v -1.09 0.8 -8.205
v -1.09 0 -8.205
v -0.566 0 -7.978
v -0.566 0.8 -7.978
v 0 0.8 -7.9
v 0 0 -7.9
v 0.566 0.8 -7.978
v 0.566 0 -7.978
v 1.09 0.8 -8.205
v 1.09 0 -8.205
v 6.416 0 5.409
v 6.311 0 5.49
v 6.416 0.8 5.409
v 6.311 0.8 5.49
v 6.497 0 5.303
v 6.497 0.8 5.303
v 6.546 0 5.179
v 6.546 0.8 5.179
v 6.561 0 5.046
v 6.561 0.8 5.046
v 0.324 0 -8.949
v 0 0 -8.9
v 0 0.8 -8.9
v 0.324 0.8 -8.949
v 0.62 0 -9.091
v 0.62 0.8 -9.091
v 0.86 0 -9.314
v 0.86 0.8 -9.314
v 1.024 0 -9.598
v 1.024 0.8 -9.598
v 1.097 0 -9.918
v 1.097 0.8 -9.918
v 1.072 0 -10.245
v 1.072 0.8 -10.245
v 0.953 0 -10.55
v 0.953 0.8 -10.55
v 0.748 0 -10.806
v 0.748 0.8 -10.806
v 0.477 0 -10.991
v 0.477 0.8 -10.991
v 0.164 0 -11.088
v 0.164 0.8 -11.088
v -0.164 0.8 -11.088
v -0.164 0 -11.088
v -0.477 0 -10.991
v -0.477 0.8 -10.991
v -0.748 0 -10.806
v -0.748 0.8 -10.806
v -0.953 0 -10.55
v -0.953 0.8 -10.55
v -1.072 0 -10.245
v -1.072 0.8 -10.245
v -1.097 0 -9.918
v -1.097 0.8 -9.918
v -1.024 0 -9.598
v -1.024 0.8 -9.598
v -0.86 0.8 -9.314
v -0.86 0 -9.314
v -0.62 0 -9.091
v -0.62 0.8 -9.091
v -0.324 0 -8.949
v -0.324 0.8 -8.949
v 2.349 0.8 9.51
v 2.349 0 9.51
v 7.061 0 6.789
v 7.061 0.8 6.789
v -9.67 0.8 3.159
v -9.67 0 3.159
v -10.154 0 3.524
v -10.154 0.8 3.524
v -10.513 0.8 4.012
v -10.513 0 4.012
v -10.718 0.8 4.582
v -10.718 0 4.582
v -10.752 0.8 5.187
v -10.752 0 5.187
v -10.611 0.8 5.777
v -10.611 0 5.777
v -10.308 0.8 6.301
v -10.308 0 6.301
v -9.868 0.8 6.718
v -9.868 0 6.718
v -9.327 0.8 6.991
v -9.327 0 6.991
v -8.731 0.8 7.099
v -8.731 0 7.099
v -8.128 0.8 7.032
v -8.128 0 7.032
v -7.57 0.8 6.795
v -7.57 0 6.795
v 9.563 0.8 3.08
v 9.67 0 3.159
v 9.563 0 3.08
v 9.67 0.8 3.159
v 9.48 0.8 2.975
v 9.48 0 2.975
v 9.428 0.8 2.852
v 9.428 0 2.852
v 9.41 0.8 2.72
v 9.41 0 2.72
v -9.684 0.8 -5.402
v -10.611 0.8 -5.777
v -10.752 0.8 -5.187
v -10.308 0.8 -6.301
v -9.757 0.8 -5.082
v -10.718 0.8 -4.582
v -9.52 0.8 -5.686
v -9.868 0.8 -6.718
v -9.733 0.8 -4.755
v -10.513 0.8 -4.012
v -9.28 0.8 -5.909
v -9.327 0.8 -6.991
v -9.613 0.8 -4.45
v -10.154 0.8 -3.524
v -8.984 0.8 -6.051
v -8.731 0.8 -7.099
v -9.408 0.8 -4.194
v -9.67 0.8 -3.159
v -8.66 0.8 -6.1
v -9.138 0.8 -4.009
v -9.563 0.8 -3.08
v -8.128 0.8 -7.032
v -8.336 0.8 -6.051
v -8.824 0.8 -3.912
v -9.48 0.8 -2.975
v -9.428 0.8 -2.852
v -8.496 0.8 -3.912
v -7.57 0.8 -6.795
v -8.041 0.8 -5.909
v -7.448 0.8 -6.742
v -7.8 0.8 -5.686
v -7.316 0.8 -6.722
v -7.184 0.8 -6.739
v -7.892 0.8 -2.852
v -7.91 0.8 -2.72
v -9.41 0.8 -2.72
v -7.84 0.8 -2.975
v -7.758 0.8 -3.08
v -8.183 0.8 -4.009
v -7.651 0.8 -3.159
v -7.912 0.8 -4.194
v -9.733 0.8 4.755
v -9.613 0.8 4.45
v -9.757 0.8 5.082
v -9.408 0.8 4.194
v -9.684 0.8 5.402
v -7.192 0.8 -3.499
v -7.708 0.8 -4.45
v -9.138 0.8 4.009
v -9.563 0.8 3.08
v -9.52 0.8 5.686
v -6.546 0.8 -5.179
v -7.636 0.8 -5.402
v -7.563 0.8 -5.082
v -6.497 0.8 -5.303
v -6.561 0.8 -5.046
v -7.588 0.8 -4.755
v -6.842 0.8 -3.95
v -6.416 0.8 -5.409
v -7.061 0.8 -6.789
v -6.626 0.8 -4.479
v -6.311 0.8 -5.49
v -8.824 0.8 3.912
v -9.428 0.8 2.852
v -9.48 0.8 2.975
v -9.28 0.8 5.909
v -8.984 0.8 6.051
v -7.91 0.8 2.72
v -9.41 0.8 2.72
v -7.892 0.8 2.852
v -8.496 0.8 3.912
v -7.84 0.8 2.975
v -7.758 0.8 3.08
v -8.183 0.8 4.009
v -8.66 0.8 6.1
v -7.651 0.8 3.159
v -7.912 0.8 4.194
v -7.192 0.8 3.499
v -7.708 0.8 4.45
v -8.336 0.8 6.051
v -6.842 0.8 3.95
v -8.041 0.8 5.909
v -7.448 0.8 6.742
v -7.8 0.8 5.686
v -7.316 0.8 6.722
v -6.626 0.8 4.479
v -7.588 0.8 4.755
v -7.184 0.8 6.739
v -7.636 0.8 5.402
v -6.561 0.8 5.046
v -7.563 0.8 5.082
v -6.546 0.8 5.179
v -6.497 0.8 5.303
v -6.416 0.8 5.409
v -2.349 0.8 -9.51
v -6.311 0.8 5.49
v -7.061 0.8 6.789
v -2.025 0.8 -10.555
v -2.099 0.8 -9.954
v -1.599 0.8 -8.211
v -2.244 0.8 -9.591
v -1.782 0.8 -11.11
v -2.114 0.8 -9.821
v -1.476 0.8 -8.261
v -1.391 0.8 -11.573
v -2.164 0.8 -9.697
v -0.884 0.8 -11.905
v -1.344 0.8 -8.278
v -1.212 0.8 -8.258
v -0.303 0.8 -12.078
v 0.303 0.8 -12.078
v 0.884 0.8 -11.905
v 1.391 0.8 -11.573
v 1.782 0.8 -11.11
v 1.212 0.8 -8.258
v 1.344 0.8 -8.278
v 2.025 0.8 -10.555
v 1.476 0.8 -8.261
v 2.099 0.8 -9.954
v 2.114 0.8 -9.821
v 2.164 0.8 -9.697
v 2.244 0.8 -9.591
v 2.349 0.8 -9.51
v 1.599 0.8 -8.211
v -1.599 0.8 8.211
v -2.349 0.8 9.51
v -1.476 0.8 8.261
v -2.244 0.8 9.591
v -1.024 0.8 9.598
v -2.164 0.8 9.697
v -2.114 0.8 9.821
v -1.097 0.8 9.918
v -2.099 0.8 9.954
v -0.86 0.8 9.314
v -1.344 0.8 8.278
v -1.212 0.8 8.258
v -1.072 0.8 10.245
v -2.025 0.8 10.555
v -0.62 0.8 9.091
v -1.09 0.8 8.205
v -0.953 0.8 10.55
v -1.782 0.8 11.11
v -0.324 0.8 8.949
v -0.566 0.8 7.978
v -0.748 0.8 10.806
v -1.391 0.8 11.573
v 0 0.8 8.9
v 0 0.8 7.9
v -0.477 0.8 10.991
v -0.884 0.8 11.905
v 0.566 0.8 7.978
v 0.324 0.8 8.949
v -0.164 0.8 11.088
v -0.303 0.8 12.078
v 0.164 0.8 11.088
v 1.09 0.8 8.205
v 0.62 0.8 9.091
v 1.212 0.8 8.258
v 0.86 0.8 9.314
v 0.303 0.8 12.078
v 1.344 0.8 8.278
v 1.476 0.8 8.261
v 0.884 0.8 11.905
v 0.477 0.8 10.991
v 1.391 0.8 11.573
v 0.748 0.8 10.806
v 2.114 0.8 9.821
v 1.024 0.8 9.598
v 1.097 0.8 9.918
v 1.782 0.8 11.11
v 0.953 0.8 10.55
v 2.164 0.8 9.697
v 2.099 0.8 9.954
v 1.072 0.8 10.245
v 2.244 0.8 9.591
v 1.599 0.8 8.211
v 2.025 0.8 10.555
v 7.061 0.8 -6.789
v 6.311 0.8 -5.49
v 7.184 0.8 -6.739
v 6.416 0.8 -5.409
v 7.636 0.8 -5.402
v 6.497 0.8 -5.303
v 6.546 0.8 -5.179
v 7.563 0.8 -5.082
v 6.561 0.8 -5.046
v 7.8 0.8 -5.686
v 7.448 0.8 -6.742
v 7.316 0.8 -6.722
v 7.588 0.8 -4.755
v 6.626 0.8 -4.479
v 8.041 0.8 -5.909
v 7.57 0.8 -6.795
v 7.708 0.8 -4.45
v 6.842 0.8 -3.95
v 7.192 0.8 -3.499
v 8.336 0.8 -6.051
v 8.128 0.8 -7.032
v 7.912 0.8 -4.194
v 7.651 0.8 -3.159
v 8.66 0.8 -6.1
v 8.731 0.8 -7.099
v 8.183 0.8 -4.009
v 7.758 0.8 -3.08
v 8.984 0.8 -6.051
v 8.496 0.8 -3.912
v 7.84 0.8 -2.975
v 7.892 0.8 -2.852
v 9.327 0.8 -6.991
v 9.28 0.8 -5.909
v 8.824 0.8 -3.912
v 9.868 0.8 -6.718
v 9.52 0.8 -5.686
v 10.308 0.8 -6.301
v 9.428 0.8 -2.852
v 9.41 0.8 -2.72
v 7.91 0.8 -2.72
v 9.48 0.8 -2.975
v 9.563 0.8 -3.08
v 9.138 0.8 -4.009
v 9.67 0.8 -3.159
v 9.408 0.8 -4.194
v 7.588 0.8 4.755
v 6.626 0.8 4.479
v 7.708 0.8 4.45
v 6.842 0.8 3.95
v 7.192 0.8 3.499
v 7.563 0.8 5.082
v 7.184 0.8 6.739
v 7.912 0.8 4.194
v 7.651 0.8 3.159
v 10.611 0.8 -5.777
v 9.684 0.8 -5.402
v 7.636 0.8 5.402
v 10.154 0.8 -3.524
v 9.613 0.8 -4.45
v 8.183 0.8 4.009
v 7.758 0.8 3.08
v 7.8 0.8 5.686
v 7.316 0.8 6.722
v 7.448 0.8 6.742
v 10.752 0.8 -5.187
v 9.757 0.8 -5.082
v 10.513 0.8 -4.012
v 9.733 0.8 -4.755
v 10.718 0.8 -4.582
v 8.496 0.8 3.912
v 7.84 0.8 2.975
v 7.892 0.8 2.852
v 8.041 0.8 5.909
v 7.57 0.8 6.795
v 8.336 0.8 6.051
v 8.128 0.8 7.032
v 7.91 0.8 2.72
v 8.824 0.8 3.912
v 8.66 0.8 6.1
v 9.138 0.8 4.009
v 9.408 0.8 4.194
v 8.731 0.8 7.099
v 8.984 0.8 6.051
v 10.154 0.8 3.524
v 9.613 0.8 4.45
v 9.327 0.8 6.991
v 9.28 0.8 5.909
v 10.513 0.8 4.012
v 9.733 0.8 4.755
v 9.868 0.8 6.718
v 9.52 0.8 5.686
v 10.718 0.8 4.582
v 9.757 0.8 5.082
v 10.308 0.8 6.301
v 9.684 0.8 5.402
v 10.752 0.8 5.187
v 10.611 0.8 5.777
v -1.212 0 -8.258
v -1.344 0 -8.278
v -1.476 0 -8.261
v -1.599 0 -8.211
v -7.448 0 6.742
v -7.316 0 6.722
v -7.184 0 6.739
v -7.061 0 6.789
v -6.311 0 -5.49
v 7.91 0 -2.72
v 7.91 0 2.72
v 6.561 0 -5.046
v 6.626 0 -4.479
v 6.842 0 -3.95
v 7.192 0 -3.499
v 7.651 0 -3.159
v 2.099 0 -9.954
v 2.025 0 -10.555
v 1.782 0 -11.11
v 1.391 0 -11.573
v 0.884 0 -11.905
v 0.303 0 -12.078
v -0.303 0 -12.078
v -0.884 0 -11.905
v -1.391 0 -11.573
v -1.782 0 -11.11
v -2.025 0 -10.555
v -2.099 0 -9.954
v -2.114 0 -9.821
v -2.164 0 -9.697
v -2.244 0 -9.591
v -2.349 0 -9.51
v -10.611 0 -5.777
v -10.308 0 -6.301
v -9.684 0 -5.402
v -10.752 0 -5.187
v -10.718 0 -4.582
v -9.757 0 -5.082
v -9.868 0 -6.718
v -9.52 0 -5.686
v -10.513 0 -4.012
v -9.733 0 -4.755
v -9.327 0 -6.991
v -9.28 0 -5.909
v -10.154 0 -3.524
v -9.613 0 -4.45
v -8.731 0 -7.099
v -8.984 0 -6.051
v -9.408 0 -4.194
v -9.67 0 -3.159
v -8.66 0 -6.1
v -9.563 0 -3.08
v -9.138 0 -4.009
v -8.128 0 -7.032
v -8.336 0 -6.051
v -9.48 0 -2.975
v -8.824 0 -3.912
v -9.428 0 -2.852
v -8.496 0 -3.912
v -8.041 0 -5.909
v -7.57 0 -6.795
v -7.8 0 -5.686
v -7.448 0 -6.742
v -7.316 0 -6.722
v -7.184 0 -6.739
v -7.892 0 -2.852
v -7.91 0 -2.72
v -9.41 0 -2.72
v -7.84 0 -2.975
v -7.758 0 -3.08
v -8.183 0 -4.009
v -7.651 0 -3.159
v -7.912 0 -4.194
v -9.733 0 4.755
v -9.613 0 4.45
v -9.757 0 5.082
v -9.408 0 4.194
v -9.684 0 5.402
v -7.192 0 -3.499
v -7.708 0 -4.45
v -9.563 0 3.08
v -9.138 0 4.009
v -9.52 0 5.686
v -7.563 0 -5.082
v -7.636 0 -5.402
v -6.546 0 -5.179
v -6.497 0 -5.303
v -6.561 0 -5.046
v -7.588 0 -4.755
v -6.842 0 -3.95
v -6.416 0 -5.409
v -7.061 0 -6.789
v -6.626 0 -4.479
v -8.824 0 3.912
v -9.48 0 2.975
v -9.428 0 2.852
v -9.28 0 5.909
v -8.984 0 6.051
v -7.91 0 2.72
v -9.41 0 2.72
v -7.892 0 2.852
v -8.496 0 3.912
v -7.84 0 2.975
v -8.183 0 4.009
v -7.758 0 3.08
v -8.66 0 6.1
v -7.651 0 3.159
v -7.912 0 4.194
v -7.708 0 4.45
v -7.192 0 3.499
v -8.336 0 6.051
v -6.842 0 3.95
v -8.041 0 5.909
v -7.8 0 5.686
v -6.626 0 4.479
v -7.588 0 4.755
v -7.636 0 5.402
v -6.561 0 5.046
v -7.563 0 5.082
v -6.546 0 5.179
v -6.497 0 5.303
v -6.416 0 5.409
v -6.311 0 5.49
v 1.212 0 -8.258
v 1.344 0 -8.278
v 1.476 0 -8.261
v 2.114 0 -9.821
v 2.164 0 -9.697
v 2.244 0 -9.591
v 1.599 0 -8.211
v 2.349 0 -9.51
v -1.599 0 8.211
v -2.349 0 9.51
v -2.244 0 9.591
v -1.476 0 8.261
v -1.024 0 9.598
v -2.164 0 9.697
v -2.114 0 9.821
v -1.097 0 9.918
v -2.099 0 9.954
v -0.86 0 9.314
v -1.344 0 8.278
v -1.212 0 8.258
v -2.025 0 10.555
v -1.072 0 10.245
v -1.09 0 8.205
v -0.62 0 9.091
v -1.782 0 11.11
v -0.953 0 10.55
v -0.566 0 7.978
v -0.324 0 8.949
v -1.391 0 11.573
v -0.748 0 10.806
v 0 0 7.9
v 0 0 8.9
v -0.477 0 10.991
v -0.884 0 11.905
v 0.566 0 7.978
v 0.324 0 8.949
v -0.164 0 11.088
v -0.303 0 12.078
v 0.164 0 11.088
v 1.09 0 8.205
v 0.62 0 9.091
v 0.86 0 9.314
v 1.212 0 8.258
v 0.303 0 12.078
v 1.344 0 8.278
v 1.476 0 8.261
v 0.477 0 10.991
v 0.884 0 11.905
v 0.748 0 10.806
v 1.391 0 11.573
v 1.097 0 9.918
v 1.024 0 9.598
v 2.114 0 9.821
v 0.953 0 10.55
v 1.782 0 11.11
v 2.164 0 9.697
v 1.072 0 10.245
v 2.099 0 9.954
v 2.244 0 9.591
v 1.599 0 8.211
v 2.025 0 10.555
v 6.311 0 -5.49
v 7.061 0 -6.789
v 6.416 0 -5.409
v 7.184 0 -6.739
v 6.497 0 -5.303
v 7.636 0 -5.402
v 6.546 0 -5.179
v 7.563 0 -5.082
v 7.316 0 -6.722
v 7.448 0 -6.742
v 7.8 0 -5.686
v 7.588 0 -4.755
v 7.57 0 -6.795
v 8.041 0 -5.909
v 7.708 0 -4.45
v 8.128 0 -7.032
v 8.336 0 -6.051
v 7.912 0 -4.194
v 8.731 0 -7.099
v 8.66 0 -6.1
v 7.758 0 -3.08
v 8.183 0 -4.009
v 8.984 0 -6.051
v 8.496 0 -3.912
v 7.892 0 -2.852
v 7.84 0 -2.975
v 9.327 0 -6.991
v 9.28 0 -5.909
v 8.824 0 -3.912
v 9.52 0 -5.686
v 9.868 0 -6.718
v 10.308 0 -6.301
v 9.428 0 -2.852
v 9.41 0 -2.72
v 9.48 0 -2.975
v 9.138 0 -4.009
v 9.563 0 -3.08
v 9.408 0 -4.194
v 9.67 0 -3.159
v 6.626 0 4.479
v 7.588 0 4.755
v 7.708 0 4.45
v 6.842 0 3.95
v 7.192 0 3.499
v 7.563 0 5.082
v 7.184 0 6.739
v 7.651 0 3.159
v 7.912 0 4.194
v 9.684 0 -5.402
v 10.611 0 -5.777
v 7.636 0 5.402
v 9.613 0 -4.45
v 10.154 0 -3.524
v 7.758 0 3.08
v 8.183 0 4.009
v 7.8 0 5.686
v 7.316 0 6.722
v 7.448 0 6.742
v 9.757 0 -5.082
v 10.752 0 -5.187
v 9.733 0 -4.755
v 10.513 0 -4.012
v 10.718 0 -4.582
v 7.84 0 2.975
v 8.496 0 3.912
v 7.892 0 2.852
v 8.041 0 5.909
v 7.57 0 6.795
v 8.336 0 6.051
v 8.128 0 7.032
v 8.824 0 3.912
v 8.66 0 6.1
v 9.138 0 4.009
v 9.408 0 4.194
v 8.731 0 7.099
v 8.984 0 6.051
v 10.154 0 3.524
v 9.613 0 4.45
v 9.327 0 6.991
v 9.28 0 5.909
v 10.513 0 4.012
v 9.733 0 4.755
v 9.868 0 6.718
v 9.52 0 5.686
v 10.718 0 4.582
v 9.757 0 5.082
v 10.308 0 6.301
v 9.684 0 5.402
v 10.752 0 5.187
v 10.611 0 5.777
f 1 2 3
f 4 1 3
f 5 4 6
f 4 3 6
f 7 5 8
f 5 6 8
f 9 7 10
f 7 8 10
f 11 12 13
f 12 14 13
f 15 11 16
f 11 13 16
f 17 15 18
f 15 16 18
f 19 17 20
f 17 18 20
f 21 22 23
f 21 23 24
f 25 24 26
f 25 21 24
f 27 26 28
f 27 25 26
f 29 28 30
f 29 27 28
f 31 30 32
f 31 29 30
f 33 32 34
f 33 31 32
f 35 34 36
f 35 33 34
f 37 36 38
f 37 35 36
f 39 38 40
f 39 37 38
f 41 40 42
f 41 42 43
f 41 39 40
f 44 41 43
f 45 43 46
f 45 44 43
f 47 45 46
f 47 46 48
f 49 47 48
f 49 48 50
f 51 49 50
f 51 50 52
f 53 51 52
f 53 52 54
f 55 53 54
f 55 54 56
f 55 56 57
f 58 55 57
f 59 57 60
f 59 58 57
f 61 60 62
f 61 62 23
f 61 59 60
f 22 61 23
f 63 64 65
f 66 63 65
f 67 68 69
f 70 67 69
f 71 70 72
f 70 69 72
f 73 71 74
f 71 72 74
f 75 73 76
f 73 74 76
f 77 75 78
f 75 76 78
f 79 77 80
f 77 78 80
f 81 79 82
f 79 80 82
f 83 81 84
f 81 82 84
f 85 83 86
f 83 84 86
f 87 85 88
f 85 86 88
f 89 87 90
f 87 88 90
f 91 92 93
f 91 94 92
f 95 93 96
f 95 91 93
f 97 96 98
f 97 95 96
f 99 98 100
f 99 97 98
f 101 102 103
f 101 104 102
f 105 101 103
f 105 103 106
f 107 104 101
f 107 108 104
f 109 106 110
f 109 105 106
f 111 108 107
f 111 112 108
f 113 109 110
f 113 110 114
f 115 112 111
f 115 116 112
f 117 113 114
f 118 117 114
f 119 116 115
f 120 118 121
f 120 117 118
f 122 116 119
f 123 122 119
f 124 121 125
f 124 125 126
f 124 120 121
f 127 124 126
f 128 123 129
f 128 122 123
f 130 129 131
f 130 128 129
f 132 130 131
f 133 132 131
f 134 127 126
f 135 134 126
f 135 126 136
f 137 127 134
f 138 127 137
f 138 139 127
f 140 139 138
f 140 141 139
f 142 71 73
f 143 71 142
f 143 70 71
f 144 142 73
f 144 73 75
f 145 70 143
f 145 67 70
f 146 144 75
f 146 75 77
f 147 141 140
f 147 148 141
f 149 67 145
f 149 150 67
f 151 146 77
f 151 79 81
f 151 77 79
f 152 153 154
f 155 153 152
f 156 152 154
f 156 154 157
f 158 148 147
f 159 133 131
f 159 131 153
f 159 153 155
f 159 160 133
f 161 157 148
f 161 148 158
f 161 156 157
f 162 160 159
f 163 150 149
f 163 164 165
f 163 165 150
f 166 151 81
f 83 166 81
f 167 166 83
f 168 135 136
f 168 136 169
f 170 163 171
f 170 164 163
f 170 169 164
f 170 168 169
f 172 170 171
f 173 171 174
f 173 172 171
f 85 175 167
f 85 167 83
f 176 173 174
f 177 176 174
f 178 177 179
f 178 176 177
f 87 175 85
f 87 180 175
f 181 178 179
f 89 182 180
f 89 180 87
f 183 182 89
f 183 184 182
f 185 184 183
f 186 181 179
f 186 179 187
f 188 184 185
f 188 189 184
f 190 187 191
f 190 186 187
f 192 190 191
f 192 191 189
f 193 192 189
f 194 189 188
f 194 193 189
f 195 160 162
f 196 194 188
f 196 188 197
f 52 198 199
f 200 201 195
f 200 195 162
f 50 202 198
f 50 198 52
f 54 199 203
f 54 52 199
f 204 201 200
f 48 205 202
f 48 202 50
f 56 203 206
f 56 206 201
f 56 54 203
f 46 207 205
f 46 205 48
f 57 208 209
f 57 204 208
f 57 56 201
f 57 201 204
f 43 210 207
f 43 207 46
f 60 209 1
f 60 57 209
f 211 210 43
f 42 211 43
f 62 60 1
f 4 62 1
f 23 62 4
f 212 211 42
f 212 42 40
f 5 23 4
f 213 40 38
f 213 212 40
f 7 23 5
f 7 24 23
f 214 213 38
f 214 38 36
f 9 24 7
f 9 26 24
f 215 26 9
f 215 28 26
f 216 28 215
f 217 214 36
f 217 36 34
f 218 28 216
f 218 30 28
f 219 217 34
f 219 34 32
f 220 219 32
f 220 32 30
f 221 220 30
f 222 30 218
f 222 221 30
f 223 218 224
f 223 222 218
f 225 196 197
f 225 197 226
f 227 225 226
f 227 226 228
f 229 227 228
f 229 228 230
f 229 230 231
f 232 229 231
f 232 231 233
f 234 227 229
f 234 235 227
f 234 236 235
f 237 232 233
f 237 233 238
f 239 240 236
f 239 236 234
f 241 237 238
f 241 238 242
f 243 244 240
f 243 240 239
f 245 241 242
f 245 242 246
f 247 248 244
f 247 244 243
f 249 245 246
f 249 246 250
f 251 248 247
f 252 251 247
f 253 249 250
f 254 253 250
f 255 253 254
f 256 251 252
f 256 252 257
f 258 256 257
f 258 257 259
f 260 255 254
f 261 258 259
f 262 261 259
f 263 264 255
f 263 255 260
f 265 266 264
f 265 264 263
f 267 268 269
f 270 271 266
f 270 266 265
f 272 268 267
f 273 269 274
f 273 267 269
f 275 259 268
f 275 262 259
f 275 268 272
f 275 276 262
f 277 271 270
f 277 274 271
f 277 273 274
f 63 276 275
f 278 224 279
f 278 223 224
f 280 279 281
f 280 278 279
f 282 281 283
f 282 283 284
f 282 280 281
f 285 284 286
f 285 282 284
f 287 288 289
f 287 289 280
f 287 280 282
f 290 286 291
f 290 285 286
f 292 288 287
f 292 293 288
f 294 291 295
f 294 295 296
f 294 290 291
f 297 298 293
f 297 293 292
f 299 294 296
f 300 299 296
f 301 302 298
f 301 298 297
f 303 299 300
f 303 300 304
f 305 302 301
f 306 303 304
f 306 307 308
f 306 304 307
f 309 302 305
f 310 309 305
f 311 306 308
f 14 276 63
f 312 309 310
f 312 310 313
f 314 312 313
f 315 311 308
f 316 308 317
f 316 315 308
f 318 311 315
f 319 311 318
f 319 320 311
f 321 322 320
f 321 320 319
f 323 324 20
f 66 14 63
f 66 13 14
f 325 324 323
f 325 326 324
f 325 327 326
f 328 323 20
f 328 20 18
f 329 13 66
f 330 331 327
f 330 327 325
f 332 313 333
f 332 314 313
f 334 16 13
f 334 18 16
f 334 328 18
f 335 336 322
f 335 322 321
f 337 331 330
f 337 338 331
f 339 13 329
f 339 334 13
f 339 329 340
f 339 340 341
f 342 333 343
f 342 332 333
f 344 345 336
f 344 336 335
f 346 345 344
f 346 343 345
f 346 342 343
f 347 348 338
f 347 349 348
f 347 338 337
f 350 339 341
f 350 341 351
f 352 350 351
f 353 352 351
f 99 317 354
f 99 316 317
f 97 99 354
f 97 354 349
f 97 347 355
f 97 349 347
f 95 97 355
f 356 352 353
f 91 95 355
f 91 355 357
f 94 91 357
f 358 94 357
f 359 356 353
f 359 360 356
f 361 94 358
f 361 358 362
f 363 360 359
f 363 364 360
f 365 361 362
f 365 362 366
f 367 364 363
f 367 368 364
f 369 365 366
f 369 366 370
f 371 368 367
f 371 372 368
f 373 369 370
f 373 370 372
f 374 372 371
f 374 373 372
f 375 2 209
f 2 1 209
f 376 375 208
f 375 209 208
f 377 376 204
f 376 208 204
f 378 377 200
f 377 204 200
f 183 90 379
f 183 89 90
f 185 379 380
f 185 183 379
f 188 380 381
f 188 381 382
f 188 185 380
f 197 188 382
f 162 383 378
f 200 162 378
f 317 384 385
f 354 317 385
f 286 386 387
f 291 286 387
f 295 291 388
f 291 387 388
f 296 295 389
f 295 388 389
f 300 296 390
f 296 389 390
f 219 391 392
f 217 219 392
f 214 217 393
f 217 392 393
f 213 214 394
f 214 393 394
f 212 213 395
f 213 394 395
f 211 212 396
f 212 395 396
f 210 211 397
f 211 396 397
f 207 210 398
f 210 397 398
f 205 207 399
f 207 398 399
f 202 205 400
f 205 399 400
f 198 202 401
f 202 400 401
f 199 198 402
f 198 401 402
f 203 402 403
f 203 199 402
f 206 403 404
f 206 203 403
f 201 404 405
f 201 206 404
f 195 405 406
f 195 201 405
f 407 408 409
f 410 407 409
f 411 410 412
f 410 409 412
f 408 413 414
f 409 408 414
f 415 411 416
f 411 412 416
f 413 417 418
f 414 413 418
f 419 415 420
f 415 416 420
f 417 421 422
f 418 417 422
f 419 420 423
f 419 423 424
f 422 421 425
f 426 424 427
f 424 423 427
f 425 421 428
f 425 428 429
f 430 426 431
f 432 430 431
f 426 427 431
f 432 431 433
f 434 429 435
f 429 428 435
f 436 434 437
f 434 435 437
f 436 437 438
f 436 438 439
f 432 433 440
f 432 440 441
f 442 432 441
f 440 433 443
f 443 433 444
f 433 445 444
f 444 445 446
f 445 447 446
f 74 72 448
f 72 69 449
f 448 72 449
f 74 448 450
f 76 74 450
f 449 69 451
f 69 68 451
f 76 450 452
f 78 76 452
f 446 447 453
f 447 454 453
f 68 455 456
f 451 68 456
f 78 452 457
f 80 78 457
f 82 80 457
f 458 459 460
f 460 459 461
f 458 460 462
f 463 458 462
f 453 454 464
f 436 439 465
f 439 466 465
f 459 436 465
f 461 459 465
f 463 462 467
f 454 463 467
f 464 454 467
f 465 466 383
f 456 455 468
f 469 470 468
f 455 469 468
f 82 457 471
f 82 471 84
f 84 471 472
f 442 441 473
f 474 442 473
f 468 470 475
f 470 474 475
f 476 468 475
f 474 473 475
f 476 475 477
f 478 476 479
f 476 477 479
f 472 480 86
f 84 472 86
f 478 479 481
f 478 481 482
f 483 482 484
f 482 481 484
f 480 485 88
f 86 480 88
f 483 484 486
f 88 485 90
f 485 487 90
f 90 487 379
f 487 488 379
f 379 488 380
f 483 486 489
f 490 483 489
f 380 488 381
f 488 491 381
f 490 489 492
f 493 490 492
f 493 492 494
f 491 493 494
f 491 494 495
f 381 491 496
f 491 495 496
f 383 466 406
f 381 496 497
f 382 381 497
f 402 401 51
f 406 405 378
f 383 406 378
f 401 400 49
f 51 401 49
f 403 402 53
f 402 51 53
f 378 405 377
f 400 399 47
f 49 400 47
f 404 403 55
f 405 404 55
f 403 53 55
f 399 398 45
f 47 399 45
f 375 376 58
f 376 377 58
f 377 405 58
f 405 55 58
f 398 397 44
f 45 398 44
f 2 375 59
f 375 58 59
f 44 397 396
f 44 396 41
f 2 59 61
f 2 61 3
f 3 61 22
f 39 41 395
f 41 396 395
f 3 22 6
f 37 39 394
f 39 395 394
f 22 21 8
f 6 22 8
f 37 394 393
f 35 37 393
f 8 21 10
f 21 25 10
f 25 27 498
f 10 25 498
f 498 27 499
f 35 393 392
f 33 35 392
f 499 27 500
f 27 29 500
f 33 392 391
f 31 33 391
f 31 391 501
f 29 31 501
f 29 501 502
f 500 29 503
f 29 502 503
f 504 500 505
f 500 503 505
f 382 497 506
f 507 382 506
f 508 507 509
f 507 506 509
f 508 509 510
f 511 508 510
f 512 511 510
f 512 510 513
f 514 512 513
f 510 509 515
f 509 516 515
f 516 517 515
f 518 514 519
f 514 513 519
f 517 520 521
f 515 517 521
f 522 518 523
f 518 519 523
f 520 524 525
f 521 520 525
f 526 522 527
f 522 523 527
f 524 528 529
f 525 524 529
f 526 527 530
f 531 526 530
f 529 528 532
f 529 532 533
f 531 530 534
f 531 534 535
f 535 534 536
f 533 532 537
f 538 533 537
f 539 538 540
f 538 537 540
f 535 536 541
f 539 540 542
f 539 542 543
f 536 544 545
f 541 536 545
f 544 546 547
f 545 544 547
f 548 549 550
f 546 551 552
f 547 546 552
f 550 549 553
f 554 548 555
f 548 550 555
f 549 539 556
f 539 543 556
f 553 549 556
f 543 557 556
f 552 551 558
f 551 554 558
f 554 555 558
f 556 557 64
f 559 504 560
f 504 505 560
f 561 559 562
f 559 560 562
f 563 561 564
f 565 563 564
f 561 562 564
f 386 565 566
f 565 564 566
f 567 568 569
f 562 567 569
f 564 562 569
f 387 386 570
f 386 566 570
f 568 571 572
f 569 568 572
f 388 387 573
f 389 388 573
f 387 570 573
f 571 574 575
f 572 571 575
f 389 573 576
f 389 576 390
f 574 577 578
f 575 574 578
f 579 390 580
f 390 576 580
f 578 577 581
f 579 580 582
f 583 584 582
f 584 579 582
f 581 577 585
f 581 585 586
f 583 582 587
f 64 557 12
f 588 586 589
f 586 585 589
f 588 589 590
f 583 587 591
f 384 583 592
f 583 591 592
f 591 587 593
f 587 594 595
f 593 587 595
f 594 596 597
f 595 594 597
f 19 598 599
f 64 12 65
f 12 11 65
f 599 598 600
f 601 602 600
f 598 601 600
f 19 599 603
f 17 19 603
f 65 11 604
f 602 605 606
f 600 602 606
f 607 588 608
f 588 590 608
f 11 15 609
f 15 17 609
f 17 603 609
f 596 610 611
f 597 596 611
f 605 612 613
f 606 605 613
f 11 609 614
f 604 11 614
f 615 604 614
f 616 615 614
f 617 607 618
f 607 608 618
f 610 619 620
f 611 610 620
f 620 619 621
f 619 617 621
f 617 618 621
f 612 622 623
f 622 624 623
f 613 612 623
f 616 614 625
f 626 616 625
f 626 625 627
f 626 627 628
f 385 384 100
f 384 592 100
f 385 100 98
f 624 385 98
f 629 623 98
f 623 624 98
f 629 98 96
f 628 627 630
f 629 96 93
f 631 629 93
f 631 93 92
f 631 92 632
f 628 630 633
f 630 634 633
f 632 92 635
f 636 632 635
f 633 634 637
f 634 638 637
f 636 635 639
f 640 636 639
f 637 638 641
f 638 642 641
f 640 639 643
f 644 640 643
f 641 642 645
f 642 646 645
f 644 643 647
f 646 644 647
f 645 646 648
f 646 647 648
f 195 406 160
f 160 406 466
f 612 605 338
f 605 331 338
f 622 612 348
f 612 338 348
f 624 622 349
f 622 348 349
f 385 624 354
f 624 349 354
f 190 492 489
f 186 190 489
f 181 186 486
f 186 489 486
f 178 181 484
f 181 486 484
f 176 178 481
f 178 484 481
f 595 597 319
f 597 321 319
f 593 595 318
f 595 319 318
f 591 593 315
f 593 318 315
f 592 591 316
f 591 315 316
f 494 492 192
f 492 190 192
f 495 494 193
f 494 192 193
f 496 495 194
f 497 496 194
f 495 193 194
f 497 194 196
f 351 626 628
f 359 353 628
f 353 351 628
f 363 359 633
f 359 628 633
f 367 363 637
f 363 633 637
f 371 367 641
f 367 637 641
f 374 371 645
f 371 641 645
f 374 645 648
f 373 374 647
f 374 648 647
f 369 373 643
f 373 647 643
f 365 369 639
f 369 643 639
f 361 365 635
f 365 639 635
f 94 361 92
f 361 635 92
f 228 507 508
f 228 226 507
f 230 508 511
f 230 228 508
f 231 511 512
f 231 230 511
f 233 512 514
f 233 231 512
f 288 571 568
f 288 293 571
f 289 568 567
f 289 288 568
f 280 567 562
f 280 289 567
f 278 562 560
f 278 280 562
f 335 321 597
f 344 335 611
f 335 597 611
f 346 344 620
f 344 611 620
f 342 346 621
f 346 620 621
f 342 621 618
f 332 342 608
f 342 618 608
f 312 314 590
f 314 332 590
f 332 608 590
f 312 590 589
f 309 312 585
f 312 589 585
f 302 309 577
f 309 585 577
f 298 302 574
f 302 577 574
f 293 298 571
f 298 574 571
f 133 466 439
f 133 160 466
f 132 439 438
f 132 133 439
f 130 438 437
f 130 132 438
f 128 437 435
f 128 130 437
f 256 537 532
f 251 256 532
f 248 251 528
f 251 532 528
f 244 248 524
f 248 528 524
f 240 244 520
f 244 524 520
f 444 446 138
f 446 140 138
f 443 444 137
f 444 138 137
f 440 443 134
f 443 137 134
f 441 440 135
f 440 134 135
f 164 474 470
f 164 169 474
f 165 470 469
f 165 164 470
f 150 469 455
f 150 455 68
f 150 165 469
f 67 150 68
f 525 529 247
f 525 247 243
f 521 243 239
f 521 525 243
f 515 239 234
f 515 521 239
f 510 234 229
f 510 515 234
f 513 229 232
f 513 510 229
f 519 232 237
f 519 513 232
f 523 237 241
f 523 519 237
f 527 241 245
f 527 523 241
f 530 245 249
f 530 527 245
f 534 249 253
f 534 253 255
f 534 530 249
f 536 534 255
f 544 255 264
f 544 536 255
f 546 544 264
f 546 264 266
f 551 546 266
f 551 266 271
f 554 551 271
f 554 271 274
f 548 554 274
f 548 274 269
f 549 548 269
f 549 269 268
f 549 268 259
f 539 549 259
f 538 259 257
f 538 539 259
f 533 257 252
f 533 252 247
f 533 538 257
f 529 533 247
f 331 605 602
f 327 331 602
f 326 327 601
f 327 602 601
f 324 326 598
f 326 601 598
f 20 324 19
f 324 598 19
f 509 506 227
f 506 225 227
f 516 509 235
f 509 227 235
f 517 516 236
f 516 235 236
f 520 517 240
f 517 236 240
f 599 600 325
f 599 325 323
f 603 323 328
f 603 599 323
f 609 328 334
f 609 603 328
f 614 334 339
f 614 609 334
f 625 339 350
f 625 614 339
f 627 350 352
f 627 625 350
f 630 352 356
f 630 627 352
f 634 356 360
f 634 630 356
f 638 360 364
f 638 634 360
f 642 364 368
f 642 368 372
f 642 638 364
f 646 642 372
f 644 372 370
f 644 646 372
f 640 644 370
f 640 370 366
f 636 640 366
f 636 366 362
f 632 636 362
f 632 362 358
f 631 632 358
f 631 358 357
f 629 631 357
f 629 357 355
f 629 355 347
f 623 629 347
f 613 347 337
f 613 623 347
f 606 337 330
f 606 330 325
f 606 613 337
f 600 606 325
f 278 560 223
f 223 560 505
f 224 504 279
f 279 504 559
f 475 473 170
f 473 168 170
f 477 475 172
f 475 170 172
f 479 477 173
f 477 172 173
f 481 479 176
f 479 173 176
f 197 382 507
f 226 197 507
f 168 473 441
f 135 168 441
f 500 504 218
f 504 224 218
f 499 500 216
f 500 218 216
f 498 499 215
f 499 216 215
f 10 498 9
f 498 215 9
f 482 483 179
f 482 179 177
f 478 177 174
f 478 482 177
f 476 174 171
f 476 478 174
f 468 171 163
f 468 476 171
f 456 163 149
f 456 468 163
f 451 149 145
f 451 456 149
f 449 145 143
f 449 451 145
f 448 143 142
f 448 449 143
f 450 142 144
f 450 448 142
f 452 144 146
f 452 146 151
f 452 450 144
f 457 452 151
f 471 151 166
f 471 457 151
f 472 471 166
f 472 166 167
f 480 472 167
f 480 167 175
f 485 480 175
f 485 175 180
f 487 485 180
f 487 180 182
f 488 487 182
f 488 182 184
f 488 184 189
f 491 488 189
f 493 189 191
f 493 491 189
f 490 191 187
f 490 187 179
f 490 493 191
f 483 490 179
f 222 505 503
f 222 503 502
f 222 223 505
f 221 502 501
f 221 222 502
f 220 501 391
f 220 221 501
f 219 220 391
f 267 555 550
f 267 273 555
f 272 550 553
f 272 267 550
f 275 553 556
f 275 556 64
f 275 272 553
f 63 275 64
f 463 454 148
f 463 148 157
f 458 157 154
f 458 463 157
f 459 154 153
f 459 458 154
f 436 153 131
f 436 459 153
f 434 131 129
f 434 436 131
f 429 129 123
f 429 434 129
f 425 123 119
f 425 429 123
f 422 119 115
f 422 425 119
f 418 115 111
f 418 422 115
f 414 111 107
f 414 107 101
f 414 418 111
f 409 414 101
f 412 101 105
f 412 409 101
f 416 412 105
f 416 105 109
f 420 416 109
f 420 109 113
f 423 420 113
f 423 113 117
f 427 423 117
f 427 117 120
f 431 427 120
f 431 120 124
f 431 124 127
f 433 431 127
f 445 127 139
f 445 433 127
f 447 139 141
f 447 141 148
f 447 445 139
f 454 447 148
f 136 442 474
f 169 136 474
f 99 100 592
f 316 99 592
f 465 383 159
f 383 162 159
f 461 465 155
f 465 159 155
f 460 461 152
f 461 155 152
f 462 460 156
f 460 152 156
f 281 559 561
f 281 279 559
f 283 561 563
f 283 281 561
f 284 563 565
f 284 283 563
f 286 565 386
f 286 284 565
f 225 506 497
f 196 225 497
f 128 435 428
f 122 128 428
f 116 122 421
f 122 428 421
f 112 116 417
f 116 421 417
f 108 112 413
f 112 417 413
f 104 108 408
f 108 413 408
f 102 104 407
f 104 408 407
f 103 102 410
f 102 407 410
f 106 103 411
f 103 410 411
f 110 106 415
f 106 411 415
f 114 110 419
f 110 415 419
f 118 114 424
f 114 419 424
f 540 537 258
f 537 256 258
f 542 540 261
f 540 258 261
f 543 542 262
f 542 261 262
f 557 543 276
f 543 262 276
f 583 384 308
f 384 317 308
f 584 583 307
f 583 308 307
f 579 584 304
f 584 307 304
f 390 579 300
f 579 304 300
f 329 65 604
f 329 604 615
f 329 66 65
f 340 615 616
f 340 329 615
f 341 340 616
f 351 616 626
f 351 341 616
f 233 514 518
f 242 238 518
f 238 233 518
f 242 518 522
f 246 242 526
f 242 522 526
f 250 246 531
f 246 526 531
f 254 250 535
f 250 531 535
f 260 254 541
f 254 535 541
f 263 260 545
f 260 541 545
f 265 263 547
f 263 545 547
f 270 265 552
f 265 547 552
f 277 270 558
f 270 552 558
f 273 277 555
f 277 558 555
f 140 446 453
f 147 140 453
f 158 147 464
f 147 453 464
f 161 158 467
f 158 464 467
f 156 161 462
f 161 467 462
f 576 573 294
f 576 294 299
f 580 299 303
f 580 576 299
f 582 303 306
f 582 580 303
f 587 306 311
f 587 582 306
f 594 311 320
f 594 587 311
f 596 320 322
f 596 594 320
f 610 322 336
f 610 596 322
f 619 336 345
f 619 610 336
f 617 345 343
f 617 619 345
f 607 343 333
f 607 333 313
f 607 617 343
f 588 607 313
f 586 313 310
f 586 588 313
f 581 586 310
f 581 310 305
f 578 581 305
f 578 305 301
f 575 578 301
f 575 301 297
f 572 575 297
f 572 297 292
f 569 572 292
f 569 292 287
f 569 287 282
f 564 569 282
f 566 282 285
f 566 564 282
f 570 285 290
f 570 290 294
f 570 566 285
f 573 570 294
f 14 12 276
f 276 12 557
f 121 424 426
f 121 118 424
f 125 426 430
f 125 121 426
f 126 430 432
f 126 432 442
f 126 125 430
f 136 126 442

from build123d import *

# Parameters (mm, degrees)
SKETCH2_R           = 1.1
BOSS_EXTRUDE1_DEPTH = 0.8
CIRPATTERN1_COUNT   = 6
FILLET1_R           = 0.5


with BuildPart() as part:
    # Sketch2 → Boss-Extrude1 (new body)
    with BuildSketch(Plane(origin=(0, 0, 0), x_dir=(1, 0, 0), z_dir=(0, 1, 0))):
        with BuildLine():
            Line((7.33654129, 6.630271315), (2.073712748, 9.668766791))
            ThreePointArc((2.073712748, 9.668766791), (-1.818653348, 11.05), (1.323712748, 8.369728685))
            Line((1.323712748, 8.369728685), (6.58654129, 5.331233209))
            ThreePointArc((6.58654129, 5.331233209), (6.84160069, 6.05), (7.33654129, 6.630271315))
        make_face()
        with Locations((0, 10)):
            Circle(SKETCH2_R, mode=Mode.SUBTRACT)
    boss_extrude1 = extrude(amount=BOSS_EXTRUDE1_DEPTH)

    # CirPattern1: Boss-Extrude1 ×6 about axis
    cirpattern1_axis = Axis((0, 0.8, 0), (0, -1, 0))
    for i in range(1, CIRPATTERN1_COUNT):
        add(boss_extrude1.rotate(cirpattern1_axis, i * 360 / CIRPATTERN1_COUNT))

    # Fillet1
    fillet1_edges = [part.edges().sort_by_distance(p)[0] for p in [
        (1.323712748, 0.4, -8.369728685),
        (-1.323712748, 0.4, -8.369728685),
        (-6.58654129, 0.4, -5.331233209),
        (-7.910254038, 0.4, -3.038495475),
        (-7.910254038, 0.4, 3.038495475),
        (-6.58654129, 0.4, 5.331233209),
        (-1.323712748, 0.4, 8.369728685),
        (1.323712748, 0.4, 8.369728685),
        (6.58654129, 0.4, 5.331233209),
        (7.910254038, 0.4, 3.038495475),
        (7.910254038, 0.4, -3.038495475),
        (6.58654129, 0.4, -5.331233209),
        (9.410254038, 0.4, -3.038495475),
        (9.410254038, 0.4, 3.038495475),
        (7.33654129, 0.4, 6.630271315),
        (2.073712748, 0.4, 9.668766791),
        (-2.073712748, 0.4, 9.668766791),
        (-9.410254038, 0.4, 3.038495475),
        (-9.410254038, 0.4, -3.038495475),
        (-7.33654129, 0.4, -6.630271315),
        (-2.073712748, 0.4, -9.668766791),
        (2.073712748, 0.4, -9.668766791),
        (7.33654129, 0.4, -6.630271315),
        (-7.33654129, 0.4, 6.630271315),
    ]]
    fillet(fillet1_edges, radius=FILLET1_R)


solid = part.part
